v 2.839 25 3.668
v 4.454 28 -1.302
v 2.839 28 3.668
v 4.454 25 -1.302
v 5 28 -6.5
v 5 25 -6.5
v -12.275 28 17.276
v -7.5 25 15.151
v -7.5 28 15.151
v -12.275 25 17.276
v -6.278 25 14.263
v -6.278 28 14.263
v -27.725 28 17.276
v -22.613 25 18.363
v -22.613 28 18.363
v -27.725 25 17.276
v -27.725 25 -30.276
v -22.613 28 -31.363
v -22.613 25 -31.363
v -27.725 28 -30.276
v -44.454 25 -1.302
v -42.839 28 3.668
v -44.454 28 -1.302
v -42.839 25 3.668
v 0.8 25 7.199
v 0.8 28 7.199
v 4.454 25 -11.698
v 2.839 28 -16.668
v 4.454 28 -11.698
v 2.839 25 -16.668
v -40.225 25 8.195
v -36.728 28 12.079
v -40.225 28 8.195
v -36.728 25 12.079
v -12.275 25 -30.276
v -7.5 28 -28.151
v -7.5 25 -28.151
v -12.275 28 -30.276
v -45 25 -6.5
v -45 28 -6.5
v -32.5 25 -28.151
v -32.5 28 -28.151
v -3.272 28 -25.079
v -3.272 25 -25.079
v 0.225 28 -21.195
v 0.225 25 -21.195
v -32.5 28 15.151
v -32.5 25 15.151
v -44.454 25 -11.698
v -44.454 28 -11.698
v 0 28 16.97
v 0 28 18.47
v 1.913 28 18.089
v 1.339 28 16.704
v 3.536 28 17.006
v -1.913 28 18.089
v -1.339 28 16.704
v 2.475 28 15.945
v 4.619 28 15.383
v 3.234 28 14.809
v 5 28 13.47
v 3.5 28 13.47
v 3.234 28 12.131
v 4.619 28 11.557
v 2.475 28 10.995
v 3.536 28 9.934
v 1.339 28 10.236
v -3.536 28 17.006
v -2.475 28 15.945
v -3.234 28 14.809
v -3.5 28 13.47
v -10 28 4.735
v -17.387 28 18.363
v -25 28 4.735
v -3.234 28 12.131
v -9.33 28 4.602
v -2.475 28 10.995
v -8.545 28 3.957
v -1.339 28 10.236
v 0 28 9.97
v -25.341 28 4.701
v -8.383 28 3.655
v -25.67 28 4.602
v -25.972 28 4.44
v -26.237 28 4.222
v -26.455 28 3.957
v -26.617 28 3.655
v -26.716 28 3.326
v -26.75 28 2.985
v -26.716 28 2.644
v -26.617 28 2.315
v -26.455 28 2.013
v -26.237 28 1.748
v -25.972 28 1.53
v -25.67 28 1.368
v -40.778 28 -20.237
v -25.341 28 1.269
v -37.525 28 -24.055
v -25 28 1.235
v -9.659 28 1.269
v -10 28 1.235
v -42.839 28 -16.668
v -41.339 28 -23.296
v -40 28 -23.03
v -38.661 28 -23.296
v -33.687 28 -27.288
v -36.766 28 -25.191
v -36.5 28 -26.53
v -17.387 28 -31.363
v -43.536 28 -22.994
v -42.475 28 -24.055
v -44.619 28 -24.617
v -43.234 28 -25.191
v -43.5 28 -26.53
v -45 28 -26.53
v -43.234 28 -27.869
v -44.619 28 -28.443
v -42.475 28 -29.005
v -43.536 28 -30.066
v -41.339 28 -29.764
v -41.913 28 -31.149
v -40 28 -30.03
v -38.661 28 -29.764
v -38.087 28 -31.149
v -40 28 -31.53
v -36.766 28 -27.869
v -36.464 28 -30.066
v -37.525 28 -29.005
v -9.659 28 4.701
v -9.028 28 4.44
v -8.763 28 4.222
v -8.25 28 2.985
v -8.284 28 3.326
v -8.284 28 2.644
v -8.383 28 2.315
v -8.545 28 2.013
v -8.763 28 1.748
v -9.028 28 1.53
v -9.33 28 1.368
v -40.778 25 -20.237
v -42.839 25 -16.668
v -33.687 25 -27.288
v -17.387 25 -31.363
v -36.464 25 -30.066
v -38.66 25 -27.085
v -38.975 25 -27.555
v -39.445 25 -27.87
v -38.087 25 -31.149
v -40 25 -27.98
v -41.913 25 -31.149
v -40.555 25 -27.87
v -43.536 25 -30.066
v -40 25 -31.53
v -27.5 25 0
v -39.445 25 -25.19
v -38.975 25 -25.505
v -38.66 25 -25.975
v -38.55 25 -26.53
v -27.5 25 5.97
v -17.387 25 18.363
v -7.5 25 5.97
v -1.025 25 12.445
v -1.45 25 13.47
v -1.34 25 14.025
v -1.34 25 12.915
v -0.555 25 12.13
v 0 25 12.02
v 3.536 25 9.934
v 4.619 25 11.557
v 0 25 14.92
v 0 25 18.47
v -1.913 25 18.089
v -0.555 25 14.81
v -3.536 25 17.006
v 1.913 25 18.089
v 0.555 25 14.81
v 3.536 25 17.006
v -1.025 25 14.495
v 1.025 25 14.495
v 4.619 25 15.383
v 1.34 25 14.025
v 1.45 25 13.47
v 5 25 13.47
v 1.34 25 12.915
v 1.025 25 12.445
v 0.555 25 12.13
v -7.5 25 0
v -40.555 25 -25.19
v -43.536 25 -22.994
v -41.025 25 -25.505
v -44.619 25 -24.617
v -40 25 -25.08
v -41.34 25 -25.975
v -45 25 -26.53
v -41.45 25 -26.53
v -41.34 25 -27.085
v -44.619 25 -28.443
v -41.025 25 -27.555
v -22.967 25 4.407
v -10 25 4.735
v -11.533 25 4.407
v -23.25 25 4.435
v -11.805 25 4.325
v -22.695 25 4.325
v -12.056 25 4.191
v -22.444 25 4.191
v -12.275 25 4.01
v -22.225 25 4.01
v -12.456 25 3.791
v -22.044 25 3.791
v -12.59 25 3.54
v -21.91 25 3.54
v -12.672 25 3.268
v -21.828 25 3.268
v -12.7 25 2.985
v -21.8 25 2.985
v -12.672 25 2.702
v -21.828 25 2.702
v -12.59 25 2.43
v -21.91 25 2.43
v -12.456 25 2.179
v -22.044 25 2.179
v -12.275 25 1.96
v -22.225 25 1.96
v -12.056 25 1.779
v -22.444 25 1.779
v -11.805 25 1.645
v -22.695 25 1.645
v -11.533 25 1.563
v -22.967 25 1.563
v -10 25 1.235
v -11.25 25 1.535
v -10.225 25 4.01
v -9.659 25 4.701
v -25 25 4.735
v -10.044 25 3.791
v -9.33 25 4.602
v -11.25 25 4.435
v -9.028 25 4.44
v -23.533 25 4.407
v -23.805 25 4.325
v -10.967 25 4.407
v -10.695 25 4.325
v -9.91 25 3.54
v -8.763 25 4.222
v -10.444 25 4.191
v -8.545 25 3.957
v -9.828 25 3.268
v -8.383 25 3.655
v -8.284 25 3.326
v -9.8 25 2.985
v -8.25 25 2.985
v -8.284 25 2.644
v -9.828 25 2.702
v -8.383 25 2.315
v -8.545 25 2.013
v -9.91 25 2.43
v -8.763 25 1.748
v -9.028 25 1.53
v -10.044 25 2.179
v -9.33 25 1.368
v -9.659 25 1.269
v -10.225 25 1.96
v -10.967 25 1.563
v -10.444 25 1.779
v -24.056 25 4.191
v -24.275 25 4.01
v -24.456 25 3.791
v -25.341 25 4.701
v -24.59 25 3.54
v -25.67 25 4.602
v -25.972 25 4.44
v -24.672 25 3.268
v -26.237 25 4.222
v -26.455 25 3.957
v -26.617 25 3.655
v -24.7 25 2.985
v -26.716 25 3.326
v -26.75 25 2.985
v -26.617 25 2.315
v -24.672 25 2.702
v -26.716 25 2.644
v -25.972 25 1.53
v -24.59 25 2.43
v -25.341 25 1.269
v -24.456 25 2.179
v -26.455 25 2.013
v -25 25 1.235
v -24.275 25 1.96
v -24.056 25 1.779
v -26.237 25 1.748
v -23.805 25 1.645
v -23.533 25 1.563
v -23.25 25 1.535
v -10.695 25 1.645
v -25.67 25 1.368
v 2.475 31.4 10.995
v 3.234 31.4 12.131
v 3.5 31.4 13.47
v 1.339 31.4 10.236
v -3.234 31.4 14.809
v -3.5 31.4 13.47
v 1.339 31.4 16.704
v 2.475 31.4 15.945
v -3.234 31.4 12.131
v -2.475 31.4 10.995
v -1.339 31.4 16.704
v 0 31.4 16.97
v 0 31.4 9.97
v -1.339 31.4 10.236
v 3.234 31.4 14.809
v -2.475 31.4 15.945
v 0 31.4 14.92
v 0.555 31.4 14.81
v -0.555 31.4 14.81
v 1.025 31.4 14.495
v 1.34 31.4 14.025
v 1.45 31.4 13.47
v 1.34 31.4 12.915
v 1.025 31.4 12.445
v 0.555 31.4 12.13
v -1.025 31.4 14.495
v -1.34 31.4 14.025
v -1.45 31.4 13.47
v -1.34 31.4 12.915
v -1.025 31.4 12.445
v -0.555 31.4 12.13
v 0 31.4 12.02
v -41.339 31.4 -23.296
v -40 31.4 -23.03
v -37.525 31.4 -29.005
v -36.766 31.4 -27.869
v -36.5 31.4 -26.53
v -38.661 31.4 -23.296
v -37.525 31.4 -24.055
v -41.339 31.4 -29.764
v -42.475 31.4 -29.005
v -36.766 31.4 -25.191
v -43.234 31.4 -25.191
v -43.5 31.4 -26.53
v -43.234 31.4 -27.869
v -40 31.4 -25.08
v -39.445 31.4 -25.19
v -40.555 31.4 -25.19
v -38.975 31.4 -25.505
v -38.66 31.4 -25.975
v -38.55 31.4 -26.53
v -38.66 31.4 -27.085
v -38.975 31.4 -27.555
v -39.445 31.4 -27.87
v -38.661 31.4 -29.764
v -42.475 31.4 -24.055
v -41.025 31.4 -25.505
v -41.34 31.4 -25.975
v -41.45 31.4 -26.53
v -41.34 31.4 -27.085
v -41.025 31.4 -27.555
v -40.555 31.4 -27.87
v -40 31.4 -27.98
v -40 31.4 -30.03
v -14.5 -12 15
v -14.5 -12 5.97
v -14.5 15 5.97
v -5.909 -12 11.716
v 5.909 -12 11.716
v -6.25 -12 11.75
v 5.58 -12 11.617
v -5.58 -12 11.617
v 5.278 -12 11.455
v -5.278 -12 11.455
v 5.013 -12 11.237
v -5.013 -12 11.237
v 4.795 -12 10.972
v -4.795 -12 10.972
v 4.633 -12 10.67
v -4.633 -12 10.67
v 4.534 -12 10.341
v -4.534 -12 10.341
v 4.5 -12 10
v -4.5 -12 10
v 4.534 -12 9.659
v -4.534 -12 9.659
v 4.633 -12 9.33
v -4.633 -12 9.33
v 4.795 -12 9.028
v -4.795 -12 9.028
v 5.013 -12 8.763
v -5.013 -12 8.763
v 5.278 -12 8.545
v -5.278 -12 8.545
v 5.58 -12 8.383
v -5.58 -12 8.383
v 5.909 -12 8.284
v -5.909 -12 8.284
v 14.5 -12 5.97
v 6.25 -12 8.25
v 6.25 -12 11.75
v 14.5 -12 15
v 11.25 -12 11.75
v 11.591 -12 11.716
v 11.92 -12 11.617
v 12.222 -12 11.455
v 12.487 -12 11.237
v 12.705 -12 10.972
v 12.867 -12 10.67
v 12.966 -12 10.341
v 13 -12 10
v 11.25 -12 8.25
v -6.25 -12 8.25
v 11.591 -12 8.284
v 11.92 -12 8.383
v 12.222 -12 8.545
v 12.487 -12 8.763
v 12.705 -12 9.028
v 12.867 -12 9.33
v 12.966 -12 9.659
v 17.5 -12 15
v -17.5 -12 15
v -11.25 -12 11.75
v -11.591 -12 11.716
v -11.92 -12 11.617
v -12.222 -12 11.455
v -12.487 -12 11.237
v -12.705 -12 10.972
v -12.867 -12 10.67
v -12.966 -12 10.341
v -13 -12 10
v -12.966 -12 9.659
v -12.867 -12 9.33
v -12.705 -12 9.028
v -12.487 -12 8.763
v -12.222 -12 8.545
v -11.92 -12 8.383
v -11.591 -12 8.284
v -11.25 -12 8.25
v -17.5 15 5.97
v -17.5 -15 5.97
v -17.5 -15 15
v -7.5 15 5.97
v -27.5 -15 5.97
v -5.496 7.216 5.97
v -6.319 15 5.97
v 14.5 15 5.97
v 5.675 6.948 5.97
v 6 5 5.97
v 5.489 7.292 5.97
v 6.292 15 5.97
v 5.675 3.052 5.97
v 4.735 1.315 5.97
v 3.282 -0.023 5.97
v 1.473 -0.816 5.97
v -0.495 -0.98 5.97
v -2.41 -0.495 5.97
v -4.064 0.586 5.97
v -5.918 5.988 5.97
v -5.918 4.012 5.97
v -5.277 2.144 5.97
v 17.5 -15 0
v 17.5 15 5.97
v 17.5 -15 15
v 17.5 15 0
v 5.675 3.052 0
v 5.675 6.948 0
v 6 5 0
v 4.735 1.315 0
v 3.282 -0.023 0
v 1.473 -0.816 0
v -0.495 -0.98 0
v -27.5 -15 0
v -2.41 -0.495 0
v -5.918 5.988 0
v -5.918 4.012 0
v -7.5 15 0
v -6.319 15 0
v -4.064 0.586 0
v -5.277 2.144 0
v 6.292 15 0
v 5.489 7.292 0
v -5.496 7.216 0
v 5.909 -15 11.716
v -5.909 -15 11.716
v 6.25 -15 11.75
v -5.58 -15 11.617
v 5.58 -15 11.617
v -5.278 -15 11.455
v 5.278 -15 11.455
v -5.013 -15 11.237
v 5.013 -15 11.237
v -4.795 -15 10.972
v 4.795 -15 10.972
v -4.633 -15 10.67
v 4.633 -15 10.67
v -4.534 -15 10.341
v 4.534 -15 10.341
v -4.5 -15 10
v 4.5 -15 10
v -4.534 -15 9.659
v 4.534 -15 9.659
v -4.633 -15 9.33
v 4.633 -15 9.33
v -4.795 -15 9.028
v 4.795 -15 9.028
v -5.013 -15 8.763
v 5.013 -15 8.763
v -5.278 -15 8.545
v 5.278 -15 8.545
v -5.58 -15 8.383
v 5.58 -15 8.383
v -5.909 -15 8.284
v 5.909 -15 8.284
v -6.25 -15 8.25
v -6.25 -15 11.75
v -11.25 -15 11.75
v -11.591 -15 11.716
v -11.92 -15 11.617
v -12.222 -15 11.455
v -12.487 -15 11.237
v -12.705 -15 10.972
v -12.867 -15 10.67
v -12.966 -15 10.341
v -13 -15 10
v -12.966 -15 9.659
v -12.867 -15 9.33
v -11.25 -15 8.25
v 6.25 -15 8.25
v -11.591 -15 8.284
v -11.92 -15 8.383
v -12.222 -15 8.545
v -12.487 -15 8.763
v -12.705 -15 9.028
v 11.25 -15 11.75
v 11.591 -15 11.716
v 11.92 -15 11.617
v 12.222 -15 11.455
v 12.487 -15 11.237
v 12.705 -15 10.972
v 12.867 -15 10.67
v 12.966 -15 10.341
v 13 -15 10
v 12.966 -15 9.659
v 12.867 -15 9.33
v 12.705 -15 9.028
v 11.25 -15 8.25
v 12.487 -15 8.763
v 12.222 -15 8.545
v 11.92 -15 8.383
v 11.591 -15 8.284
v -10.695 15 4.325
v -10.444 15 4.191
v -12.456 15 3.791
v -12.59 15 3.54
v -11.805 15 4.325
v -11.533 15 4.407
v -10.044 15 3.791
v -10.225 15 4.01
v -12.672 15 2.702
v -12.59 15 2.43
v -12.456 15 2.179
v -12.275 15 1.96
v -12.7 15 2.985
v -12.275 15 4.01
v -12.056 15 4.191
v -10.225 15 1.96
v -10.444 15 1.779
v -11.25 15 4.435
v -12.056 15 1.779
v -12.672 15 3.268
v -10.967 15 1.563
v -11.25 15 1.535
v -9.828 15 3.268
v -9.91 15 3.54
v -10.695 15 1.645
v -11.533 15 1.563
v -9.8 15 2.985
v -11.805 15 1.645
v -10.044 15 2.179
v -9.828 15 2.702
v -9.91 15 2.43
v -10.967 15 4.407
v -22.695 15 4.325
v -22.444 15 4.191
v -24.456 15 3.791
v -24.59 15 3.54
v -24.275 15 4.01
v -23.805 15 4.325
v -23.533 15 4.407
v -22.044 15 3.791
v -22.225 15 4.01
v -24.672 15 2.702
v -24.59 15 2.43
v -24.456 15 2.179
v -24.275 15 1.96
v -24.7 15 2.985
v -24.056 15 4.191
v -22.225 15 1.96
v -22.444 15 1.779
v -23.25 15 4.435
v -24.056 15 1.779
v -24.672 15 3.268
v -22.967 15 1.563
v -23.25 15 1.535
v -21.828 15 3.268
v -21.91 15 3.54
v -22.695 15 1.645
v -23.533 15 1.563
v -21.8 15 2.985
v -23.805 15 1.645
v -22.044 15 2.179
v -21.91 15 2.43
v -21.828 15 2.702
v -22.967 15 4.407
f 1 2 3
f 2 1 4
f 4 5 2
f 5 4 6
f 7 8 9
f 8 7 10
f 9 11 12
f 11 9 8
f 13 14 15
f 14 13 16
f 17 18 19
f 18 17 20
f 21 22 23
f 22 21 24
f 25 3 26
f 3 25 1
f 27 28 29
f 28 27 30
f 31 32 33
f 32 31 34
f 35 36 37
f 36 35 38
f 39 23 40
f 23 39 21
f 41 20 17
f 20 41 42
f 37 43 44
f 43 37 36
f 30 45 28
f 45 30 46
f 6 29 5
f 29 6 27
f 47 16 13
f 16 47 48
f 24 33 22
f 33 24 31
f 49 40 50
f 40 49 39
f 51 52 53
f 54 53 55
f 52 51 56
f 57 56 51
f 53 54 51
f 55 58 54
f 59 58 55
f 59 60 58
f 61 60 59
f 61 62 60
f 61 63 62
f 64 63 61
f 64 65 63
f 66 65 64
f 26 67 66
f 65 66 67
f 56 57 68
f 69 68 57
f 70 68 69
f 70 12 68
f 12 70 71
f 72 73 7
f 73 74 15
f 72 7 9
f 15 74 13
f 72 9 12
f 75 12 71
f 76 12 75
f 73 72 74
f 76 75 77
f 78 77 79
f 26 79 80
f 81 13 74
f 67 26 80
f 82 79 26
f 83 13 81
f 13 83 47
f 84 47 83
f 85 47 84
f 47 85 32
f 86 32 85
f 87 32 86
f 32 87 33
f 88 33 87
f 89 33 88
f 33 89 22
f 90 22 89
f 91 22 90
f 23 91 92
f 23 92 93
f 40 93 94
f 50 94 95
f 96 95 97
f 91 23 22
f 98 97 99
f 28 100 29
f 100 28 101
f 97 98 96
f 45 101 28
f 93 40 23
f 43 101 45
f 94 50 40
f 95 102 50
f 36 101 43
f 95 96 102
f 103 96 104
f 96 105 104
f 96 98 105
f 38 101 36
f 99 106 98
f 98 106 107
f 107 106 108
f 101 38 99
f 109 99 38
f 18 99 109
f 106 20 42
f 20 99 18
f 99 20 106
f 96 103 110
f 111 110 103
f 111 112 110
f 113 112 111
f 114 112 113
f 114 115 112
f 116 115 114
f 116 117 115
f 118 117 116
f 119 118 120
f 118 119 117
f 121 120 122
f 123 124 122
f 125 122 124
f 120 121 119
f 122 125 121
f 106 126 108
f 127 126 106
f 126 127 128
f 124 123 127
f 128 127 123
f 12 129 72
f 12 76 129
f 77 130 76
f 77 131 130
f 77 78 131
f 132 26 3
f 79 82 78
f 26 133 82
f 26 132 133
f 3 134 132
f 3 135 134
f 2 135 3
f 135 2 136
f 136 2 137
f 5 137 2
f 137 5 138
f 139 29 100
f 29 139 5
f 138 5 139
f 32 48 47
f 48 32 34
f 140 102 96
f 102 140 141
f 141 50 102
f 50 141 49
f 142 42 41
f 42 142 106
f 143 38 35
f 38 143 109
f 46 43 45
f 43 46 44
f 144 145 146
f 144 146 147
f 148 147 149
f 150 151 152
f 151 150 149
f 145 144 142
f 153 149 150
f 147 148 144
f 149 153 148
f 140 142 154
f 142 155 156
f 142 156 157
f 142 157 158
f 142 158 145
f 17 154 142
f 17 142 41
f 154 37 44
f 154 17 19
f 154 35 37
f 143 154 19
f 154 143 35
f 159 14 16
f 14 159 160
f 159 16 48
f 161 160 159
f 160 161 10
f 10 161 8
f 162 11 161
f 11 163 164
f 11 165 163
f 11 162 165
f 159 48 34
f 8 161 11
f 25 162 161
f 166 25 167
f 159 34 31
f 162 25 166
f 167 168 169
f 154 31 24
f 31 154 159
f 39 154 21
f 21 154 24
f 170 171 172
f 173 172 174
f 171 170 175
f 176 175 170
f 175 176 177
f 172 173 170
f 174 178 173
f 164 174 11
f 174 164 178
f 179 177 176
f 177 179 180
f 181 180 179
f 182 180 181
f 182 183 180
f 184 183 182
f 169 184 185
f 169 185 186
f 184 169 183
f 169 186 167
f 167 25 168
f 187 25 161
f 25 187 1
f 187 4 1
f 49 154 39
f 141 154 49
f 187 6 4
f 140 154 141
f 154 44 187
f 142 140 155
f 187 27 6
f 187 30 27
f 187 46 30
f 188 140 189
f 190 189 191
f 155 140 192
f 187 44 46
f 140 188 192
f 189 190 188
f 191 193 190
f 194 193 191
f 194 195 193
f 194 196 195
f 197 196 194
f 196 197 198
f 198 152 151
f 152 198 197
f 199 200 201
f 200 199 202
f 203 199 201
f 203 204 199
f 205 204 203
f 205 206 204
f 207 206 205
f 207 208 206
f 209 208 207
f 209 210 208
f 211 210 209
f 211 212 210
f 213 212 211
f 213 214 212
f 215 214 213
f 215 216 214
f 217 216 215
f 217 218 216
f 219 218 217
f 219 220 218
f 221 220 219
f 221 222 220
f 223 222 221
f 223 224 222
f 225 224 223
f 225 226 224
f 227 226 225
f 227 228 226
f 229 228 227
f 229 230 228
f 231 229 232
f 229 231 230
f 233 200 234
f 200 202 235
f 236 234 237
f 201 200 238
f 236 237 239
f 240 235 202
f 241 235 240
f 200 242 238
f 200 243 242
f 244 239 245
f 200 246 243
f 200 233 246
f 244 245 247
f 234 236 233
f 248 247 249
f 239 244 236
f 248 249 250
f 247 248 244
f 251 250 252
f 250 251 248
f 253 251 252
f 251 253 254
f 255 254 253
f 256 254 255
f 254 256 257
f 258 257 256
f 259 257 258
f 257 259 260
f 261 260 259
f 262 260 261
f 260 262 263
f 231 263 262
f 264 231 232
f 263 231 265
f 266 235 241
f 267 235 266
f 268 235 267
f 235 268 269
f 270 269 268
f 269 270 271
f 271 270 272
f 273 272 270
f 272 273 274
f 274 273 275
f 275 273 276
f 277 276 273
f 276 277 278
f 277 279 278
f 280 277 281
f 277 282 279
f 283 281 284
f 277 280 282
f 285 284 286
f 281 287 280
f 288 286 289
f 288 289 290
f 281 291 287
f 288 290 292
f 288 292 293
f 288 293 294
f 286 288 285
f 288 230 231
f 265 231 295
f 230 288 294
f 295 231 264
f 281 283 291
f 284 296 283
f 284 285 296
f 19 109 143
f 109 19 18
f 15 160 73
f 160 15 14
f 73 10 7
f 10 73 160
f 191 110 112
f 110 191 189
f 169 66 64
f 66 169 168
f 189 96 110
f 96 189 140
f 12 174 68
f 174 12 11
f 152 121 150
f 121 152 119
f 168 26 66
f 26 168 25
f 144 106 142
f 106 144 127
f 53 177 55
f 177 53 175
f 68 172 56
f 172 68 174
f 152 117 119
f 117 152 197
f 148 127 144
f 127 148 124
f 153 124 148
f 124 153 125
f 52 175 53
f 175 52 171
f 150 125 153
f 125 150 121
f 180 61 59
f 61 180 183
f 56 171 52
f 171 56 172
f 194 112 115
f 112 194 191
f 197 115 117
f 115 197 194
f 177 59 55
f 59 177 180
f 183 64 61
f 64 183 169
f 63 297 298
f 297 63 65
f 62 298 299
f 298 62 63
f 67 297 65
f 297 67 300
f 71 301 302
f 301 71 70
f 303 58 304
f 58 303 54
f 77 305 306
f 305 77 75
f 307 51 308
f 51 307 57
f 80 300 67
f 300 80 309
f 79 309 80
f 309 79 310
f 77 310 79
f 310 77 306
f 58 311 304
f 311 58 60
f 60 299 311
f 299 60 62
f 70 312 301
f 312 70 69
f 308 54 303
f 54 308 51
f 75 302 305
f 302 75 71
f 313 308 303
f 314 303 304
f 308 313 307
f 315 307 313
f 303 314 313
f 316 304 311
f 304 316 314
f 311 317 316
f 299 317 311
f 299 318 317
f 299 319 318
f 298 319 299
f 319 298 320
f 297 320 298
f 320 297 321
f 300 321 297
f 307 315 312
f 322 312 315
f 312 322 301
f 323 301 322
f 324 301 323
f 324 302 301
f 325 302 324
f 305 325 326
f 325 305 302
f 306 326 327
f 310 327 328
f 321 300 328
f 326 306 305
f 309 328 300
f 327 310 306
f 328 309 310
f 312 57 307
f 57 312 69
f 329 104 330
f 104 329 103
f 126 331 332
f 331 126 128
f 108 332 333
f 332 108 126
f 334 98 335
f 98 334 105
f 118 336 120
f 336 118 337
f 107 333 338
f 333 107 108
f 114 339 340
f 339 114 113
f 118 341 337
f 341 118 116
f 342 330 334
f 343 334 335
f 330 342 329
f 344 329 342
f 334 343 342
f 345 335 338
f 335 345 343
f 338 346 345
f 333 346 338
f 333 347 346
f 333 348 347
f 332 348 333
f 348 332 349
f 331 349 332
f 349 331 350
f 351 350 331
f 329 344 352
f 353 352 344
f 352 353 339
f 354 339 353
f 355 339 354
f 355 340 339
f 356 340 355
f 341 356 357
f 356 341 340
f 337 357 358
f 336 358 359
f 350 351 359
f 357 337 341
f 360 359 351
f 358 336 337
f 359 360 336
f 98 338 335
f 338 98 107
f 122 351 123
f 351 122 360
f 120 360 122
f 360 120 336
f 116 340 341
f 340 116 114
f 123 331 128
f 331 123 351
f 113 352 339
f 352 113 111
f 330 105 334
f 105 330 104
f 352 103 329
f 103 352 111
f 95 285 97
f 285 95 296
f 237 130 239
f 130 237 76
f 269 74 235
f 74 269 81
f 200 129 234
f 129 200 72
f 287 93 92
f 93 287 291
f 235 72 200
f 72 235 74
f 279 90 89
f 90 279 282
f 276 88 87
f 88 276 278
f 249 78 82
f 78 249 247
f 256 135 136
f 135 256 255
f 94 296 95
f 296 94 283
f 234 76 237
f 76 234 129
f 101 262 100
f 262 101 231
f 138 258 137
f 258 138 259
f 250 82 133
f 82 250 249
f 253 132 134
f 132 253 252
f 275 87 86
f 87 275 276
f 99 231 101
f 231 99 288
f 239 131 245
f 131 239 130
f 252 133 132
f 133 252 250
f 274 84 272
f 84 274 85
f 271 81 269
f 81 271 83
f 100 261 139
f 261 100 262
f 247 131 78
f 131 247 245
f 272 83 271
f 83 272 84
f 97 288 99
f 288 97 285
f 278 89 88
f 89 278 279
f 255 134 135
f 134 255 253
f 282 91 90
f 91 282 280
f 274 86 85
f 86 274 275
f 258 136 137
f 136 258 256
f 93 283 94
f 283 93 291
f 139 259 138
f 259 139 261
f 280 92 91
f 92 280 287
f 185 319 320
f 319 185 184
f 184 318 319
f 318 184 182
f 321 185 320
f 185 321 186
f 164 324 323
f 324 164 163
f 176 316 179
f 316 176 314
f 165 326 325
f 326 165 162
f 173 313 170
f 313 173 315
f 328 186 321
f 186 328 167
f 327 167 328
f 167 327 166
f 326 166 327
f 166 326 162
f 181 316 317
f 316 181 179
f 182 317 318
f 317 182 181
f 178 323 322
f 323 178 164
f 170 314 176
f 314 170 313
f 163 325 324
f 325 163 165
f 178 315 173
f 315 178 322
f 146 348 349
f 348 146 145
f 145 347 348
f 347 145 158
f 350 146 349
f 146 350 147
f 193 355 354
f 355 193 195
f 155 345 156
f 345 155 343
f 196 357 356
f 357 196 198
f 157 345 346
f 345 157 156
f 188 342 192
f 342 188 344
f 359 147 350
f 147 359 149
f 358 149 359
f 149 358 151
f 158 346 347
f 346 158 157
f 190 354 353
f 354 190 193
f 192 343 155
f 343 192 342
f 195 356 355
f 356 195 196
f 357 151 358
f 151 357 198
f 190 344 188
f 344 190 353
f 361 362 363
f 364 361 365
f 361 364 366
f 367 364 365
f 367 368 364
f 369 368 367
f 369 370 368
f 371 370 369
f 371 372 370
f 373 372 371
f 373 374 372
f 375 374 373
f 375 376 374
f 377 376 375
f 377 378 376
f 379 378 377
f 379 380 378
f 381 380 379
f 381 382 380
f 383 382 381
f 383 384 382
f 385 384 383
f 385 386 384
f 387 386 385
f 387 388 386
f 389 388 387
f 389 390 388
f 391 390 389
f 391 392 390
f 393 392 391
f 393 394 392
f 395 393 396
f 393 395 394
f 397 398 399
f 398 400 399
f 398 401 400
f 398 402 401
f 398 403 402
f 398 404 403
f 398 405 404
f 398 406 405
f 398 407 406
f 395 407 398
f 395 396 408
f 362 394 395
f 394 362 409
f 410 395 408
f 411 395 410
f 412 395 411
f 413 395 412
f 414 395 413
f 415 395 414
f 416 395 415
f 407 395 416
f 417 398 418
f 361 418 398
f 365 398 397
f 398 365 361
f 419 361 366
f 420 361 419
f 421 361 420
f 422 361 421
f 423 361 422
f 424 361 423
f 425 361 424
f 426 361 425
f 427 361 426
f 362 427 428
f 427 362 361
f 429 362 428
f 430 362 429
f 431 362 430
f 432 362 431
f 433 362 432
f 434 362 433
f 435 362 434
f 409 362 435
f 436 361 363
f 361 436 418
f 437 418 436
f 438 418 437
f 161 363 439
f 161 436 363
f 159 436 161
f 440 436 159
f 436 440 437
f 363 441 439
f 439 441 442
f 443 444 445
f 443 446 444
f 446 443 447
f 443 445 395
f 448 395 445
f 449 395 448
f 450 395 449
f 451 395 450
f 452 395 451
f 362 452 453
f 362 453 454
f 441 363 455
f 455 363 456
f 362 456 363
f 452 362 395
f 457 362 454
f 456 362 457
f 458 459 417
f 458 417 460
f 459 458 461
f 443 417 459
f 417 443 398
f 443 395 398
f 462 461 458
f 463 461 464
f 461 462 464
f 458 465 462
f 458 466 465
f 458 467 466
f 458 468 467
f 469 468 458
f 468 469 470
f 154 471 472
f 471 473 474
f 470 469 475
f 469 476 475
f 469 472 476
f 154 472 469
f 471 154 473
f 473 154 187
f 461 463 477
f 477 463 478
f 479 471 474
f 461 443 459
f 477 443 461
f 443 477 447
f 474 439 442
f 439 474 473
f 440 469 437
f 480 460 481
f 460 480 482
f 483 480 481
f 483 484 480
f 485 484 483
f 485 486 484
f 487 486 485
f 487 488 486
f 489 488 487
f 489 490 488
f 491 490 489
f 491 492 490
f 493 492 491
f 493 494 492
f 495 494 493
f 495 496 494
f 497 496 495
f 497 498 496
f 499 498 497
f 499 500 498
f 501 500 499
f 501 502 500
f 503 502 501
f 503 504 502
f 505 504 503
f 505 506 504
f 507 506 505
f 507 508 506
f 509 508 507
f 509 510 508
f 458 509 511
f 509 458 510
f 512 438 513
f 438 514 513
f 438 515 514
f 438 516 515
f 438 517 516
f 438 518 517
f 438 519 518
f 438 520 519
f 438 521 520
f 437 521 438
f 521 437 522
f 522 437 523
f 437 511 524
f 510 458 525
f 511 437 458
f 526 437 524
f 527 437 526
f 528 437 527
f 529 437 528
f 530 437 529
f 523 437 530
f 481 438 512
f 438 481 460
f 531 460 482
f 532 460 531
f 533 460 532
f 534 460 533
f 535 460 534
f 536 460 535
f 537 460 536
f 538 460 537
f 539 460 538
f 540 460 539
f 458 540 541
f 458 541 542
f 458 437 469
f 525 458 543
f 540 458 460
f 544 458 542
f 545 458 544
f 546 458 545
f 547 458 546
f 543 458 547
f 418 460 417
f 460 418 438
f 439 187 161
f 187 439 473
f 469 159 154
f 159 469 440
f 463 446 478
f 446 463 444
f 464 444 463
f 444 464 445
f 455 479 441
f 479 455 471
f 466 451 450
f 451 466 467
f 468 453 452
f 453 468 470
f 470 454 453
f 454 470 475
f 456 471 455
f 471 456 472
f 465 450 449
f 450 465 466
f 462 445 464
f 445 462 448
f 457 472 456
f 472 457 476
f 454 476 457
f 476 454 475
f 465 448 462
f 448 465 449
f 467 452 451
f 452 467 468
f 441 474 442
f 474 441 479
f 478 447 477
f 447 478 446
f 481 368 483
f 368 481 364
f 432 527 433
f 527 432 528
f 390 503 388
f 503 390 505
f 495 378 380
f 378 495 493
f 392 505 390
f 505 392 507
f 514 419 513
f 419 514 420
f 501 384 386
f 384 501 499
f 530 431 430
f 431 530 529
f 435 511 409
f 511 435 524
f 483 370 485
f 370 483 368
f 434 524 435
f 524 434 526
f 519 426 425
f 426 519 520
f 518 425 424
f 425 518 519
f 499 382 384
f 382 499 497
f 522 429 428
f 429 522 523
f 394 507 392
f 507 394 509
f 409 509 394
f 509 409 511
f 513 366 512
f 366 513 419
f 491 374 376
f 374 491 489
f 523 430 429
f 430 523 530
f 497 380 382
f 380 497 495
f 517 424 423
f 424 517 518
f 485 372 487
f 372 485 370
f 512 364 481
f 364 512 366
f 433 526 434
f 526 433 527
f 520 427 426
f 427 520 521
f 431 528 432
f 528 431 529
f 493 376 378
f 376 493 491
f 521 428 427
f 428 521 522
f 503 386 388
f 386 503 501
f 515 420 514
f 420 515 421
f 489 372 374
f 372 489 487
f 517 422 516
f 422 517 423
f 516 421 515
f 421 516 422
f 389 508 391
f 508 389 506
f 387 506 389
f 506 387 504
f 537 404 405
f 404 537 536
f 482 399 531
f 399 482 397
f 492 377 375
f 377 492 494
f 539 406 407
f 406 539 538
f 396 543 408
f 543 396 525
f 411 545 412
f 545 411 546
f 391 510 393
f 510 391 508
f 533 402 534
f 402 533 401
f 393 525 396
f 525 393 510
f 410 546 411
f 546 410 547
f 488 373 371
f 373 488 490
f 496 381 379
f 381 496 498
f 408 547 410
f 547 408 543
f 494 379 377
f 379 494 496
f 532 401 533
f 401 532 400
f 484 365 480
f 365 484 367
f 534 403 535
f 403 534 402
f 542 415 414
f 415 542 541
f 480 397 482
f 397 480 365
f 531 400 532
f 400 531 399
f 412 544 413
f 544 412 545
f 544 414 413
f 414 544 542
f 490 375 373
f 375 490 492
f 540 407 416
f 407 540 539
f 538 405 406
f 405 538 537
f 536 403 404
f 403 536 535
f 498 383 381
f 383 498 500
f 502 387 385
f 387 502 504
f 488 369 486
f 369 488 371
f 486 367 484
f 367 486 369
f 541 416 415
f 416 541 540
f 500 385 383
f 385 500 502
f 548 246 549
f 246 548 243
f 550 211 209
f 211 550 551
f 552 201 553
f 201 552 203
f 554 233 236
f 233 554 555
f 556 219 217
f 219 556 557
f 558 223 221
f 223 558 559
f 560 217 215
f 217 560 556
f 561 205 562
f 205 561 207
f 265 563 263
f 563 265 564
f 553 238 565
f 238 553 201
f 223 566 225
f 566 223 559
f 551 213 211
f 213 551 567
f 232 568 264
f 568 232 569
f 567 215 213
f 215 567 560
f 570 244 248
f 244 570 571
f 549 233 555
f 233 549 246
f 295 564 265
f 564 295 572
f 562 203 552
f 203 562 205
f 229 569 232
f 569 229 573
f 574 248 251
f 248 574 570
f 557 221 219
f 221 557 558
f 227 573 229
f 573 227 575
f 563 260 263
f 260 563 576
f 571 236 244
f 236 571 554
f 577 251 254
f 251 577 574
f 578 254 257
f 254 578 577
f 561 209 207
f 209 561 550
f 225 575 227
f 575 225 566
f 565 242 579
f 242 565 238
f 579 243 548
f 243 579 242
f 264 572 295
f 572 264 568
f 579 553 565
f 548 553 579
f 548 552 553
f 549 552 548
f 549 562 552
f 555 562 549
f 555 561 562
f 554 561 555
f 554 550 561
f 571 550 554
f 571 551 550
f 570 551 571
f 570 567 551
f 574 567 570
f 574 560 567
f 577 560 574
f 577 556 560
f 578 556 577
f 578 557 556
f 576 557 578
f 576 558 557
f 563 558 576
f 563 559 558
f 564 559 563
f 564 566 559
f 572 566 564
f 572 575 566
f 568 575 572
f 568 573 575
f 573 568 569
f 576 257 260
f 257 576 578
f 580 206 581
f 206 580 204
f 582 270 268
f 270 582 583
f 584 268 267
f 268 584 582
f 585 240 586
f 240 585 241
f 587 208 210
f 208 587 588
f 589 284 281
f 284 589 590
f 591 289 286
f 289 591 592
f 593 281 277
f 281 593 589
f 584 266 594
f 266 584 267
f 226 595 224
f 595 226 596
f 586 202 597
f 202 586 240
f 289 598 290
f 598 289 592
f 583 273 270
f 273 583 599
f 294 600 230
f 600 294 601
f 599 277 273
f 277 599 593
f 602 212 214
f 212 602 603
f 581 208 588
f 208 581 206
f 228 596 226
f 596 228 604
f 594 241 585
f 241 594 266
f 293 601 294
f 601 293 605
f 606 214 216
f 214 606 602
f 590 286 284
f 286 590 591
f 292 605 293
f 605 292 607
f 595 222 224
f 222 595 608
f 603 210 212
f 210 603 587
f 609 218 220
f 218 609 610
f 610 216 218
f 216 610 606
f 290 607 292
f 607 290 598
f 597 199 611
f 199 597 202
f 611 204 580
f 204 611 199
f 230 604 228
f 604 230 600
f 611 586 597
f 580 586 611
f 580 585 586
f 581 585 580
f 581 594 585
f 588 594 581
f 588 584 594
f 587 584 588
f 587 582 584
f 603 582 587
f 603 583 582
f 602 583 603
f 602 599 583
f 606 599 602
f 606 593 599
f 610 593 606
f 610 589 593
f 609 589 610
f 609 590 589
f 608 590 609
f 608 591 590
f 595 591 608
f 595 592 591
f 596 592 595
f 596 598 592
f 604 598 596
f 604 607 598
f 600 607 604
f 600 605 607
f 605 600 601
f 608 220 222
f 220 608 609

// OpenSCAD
base_width = 35;
printing = false;

module e3d_cutout(){
    translate([0,5]){
        translate([0,0,-1])cylinder(d=12,h=10); //e3d size
        hull(){ //remp
            translate([0,0,-1])cylinder(d=10.5,h=10);
            translate([0,12,-1])cylinder(d=13,h=10);
        }
    }
}

module base(){
    union(){
        color("red")translate([0,0,5.97/2])cube([base_width,30,5.97],center=true);
        color("yellow")translate([0,-15+1.5,15/2])cube([base_width,3,15],center=true);
        color("cyan")for (i=[-(base_width/2)+3:(base_width-3):base_width]){translate([i,-15+3,5.97])rotate([0,-90])linear_extrude(3)polygon(points=[[0,0],[15-5.97,0],[0,27]]);}
        color("blue")translate([-base_width/2,5,5.97/2])cube([20,40,5.97],center=true);
    }
    
    
}

module fanmount(){
    color("green"){
        translate([-20,28,-8.5])rotate([90,0])cylinder(d=50,h=3); //main roundy bit
        hull(){ //sticky outy bits
            translate([0,28,5.97+5.5])rotate([90,0])cylinder(d=10,h=3,$fn=16);
            translate([-40,28,5.97+5.5-40])rotate([90,0])cylinder(d=10,h=3,$fn=16);
        }
        translate([0,28,5.97+5.5])rotate([-90,0])cylinder(d=7,h=3.4,$fn=16); //spacers on the sticky outy bits
        translate([-40,28,5.97+5.5-40])rotate([-90,0])cylinder(d=7,h=3.4,$fn=16);//spacers on the sticky outy bits
    }
    
    
}

module screwholes(w,d){
    rotate([-90,0])hull(){
        translate([-w/2,0,0])cylinder(d=d,h=10,$fn=32);
        translate([w/2,0,0])cylinder(d=d,h=10,$fn=32);
    } 
        
}

if (printing==true){
    translate([45,0,3])
        rotate([90,0])
            translate([20,-28,8.5])
                fanbkt();
}
else {fanbkt();}

module fanbkt(){
    difference(){
        translate([0,0,2])fanmount();
        //cutouts for fan mount
        union(){
            color("black")translate([-base_width/2,20,5.97/2])screwholes(w=15,d=3.5); // hole for mounting fan back to thing
            translate([0,27.5,5.97+5.5+2])rotate([-90,0])cylinder(d=2.9,h=10,$fn=16,center=true);
            translate([-40,27.5,5.97+5.5-40+2])rotate([-90,0])cylinder(d=2.9,h=10,$fn=16,center=true);
        }
    }
}

difference(){
    base();
    //cutouts for base
    color("black")union(){
        e3d_cutout();
        translate([-base_width/4,-20,10])screwholes(w=5,d=3.5); // hole for mounting to carriage
        translate([base_width/4,-20,10])screwholes(w=5,d=3.5); // hole for mounting to carriage
        color("black")translate([-(base_width/4+2.5),15,5.97/2])screwholes(w=0,d=2.9); // hole for mounting fan back to thing
        color("black")translate([-((base_width/4+2.5)+12),15,5.97/2])screwholes(w=0,d=2.9); // hole for mounting fan back to thing
    }
}
